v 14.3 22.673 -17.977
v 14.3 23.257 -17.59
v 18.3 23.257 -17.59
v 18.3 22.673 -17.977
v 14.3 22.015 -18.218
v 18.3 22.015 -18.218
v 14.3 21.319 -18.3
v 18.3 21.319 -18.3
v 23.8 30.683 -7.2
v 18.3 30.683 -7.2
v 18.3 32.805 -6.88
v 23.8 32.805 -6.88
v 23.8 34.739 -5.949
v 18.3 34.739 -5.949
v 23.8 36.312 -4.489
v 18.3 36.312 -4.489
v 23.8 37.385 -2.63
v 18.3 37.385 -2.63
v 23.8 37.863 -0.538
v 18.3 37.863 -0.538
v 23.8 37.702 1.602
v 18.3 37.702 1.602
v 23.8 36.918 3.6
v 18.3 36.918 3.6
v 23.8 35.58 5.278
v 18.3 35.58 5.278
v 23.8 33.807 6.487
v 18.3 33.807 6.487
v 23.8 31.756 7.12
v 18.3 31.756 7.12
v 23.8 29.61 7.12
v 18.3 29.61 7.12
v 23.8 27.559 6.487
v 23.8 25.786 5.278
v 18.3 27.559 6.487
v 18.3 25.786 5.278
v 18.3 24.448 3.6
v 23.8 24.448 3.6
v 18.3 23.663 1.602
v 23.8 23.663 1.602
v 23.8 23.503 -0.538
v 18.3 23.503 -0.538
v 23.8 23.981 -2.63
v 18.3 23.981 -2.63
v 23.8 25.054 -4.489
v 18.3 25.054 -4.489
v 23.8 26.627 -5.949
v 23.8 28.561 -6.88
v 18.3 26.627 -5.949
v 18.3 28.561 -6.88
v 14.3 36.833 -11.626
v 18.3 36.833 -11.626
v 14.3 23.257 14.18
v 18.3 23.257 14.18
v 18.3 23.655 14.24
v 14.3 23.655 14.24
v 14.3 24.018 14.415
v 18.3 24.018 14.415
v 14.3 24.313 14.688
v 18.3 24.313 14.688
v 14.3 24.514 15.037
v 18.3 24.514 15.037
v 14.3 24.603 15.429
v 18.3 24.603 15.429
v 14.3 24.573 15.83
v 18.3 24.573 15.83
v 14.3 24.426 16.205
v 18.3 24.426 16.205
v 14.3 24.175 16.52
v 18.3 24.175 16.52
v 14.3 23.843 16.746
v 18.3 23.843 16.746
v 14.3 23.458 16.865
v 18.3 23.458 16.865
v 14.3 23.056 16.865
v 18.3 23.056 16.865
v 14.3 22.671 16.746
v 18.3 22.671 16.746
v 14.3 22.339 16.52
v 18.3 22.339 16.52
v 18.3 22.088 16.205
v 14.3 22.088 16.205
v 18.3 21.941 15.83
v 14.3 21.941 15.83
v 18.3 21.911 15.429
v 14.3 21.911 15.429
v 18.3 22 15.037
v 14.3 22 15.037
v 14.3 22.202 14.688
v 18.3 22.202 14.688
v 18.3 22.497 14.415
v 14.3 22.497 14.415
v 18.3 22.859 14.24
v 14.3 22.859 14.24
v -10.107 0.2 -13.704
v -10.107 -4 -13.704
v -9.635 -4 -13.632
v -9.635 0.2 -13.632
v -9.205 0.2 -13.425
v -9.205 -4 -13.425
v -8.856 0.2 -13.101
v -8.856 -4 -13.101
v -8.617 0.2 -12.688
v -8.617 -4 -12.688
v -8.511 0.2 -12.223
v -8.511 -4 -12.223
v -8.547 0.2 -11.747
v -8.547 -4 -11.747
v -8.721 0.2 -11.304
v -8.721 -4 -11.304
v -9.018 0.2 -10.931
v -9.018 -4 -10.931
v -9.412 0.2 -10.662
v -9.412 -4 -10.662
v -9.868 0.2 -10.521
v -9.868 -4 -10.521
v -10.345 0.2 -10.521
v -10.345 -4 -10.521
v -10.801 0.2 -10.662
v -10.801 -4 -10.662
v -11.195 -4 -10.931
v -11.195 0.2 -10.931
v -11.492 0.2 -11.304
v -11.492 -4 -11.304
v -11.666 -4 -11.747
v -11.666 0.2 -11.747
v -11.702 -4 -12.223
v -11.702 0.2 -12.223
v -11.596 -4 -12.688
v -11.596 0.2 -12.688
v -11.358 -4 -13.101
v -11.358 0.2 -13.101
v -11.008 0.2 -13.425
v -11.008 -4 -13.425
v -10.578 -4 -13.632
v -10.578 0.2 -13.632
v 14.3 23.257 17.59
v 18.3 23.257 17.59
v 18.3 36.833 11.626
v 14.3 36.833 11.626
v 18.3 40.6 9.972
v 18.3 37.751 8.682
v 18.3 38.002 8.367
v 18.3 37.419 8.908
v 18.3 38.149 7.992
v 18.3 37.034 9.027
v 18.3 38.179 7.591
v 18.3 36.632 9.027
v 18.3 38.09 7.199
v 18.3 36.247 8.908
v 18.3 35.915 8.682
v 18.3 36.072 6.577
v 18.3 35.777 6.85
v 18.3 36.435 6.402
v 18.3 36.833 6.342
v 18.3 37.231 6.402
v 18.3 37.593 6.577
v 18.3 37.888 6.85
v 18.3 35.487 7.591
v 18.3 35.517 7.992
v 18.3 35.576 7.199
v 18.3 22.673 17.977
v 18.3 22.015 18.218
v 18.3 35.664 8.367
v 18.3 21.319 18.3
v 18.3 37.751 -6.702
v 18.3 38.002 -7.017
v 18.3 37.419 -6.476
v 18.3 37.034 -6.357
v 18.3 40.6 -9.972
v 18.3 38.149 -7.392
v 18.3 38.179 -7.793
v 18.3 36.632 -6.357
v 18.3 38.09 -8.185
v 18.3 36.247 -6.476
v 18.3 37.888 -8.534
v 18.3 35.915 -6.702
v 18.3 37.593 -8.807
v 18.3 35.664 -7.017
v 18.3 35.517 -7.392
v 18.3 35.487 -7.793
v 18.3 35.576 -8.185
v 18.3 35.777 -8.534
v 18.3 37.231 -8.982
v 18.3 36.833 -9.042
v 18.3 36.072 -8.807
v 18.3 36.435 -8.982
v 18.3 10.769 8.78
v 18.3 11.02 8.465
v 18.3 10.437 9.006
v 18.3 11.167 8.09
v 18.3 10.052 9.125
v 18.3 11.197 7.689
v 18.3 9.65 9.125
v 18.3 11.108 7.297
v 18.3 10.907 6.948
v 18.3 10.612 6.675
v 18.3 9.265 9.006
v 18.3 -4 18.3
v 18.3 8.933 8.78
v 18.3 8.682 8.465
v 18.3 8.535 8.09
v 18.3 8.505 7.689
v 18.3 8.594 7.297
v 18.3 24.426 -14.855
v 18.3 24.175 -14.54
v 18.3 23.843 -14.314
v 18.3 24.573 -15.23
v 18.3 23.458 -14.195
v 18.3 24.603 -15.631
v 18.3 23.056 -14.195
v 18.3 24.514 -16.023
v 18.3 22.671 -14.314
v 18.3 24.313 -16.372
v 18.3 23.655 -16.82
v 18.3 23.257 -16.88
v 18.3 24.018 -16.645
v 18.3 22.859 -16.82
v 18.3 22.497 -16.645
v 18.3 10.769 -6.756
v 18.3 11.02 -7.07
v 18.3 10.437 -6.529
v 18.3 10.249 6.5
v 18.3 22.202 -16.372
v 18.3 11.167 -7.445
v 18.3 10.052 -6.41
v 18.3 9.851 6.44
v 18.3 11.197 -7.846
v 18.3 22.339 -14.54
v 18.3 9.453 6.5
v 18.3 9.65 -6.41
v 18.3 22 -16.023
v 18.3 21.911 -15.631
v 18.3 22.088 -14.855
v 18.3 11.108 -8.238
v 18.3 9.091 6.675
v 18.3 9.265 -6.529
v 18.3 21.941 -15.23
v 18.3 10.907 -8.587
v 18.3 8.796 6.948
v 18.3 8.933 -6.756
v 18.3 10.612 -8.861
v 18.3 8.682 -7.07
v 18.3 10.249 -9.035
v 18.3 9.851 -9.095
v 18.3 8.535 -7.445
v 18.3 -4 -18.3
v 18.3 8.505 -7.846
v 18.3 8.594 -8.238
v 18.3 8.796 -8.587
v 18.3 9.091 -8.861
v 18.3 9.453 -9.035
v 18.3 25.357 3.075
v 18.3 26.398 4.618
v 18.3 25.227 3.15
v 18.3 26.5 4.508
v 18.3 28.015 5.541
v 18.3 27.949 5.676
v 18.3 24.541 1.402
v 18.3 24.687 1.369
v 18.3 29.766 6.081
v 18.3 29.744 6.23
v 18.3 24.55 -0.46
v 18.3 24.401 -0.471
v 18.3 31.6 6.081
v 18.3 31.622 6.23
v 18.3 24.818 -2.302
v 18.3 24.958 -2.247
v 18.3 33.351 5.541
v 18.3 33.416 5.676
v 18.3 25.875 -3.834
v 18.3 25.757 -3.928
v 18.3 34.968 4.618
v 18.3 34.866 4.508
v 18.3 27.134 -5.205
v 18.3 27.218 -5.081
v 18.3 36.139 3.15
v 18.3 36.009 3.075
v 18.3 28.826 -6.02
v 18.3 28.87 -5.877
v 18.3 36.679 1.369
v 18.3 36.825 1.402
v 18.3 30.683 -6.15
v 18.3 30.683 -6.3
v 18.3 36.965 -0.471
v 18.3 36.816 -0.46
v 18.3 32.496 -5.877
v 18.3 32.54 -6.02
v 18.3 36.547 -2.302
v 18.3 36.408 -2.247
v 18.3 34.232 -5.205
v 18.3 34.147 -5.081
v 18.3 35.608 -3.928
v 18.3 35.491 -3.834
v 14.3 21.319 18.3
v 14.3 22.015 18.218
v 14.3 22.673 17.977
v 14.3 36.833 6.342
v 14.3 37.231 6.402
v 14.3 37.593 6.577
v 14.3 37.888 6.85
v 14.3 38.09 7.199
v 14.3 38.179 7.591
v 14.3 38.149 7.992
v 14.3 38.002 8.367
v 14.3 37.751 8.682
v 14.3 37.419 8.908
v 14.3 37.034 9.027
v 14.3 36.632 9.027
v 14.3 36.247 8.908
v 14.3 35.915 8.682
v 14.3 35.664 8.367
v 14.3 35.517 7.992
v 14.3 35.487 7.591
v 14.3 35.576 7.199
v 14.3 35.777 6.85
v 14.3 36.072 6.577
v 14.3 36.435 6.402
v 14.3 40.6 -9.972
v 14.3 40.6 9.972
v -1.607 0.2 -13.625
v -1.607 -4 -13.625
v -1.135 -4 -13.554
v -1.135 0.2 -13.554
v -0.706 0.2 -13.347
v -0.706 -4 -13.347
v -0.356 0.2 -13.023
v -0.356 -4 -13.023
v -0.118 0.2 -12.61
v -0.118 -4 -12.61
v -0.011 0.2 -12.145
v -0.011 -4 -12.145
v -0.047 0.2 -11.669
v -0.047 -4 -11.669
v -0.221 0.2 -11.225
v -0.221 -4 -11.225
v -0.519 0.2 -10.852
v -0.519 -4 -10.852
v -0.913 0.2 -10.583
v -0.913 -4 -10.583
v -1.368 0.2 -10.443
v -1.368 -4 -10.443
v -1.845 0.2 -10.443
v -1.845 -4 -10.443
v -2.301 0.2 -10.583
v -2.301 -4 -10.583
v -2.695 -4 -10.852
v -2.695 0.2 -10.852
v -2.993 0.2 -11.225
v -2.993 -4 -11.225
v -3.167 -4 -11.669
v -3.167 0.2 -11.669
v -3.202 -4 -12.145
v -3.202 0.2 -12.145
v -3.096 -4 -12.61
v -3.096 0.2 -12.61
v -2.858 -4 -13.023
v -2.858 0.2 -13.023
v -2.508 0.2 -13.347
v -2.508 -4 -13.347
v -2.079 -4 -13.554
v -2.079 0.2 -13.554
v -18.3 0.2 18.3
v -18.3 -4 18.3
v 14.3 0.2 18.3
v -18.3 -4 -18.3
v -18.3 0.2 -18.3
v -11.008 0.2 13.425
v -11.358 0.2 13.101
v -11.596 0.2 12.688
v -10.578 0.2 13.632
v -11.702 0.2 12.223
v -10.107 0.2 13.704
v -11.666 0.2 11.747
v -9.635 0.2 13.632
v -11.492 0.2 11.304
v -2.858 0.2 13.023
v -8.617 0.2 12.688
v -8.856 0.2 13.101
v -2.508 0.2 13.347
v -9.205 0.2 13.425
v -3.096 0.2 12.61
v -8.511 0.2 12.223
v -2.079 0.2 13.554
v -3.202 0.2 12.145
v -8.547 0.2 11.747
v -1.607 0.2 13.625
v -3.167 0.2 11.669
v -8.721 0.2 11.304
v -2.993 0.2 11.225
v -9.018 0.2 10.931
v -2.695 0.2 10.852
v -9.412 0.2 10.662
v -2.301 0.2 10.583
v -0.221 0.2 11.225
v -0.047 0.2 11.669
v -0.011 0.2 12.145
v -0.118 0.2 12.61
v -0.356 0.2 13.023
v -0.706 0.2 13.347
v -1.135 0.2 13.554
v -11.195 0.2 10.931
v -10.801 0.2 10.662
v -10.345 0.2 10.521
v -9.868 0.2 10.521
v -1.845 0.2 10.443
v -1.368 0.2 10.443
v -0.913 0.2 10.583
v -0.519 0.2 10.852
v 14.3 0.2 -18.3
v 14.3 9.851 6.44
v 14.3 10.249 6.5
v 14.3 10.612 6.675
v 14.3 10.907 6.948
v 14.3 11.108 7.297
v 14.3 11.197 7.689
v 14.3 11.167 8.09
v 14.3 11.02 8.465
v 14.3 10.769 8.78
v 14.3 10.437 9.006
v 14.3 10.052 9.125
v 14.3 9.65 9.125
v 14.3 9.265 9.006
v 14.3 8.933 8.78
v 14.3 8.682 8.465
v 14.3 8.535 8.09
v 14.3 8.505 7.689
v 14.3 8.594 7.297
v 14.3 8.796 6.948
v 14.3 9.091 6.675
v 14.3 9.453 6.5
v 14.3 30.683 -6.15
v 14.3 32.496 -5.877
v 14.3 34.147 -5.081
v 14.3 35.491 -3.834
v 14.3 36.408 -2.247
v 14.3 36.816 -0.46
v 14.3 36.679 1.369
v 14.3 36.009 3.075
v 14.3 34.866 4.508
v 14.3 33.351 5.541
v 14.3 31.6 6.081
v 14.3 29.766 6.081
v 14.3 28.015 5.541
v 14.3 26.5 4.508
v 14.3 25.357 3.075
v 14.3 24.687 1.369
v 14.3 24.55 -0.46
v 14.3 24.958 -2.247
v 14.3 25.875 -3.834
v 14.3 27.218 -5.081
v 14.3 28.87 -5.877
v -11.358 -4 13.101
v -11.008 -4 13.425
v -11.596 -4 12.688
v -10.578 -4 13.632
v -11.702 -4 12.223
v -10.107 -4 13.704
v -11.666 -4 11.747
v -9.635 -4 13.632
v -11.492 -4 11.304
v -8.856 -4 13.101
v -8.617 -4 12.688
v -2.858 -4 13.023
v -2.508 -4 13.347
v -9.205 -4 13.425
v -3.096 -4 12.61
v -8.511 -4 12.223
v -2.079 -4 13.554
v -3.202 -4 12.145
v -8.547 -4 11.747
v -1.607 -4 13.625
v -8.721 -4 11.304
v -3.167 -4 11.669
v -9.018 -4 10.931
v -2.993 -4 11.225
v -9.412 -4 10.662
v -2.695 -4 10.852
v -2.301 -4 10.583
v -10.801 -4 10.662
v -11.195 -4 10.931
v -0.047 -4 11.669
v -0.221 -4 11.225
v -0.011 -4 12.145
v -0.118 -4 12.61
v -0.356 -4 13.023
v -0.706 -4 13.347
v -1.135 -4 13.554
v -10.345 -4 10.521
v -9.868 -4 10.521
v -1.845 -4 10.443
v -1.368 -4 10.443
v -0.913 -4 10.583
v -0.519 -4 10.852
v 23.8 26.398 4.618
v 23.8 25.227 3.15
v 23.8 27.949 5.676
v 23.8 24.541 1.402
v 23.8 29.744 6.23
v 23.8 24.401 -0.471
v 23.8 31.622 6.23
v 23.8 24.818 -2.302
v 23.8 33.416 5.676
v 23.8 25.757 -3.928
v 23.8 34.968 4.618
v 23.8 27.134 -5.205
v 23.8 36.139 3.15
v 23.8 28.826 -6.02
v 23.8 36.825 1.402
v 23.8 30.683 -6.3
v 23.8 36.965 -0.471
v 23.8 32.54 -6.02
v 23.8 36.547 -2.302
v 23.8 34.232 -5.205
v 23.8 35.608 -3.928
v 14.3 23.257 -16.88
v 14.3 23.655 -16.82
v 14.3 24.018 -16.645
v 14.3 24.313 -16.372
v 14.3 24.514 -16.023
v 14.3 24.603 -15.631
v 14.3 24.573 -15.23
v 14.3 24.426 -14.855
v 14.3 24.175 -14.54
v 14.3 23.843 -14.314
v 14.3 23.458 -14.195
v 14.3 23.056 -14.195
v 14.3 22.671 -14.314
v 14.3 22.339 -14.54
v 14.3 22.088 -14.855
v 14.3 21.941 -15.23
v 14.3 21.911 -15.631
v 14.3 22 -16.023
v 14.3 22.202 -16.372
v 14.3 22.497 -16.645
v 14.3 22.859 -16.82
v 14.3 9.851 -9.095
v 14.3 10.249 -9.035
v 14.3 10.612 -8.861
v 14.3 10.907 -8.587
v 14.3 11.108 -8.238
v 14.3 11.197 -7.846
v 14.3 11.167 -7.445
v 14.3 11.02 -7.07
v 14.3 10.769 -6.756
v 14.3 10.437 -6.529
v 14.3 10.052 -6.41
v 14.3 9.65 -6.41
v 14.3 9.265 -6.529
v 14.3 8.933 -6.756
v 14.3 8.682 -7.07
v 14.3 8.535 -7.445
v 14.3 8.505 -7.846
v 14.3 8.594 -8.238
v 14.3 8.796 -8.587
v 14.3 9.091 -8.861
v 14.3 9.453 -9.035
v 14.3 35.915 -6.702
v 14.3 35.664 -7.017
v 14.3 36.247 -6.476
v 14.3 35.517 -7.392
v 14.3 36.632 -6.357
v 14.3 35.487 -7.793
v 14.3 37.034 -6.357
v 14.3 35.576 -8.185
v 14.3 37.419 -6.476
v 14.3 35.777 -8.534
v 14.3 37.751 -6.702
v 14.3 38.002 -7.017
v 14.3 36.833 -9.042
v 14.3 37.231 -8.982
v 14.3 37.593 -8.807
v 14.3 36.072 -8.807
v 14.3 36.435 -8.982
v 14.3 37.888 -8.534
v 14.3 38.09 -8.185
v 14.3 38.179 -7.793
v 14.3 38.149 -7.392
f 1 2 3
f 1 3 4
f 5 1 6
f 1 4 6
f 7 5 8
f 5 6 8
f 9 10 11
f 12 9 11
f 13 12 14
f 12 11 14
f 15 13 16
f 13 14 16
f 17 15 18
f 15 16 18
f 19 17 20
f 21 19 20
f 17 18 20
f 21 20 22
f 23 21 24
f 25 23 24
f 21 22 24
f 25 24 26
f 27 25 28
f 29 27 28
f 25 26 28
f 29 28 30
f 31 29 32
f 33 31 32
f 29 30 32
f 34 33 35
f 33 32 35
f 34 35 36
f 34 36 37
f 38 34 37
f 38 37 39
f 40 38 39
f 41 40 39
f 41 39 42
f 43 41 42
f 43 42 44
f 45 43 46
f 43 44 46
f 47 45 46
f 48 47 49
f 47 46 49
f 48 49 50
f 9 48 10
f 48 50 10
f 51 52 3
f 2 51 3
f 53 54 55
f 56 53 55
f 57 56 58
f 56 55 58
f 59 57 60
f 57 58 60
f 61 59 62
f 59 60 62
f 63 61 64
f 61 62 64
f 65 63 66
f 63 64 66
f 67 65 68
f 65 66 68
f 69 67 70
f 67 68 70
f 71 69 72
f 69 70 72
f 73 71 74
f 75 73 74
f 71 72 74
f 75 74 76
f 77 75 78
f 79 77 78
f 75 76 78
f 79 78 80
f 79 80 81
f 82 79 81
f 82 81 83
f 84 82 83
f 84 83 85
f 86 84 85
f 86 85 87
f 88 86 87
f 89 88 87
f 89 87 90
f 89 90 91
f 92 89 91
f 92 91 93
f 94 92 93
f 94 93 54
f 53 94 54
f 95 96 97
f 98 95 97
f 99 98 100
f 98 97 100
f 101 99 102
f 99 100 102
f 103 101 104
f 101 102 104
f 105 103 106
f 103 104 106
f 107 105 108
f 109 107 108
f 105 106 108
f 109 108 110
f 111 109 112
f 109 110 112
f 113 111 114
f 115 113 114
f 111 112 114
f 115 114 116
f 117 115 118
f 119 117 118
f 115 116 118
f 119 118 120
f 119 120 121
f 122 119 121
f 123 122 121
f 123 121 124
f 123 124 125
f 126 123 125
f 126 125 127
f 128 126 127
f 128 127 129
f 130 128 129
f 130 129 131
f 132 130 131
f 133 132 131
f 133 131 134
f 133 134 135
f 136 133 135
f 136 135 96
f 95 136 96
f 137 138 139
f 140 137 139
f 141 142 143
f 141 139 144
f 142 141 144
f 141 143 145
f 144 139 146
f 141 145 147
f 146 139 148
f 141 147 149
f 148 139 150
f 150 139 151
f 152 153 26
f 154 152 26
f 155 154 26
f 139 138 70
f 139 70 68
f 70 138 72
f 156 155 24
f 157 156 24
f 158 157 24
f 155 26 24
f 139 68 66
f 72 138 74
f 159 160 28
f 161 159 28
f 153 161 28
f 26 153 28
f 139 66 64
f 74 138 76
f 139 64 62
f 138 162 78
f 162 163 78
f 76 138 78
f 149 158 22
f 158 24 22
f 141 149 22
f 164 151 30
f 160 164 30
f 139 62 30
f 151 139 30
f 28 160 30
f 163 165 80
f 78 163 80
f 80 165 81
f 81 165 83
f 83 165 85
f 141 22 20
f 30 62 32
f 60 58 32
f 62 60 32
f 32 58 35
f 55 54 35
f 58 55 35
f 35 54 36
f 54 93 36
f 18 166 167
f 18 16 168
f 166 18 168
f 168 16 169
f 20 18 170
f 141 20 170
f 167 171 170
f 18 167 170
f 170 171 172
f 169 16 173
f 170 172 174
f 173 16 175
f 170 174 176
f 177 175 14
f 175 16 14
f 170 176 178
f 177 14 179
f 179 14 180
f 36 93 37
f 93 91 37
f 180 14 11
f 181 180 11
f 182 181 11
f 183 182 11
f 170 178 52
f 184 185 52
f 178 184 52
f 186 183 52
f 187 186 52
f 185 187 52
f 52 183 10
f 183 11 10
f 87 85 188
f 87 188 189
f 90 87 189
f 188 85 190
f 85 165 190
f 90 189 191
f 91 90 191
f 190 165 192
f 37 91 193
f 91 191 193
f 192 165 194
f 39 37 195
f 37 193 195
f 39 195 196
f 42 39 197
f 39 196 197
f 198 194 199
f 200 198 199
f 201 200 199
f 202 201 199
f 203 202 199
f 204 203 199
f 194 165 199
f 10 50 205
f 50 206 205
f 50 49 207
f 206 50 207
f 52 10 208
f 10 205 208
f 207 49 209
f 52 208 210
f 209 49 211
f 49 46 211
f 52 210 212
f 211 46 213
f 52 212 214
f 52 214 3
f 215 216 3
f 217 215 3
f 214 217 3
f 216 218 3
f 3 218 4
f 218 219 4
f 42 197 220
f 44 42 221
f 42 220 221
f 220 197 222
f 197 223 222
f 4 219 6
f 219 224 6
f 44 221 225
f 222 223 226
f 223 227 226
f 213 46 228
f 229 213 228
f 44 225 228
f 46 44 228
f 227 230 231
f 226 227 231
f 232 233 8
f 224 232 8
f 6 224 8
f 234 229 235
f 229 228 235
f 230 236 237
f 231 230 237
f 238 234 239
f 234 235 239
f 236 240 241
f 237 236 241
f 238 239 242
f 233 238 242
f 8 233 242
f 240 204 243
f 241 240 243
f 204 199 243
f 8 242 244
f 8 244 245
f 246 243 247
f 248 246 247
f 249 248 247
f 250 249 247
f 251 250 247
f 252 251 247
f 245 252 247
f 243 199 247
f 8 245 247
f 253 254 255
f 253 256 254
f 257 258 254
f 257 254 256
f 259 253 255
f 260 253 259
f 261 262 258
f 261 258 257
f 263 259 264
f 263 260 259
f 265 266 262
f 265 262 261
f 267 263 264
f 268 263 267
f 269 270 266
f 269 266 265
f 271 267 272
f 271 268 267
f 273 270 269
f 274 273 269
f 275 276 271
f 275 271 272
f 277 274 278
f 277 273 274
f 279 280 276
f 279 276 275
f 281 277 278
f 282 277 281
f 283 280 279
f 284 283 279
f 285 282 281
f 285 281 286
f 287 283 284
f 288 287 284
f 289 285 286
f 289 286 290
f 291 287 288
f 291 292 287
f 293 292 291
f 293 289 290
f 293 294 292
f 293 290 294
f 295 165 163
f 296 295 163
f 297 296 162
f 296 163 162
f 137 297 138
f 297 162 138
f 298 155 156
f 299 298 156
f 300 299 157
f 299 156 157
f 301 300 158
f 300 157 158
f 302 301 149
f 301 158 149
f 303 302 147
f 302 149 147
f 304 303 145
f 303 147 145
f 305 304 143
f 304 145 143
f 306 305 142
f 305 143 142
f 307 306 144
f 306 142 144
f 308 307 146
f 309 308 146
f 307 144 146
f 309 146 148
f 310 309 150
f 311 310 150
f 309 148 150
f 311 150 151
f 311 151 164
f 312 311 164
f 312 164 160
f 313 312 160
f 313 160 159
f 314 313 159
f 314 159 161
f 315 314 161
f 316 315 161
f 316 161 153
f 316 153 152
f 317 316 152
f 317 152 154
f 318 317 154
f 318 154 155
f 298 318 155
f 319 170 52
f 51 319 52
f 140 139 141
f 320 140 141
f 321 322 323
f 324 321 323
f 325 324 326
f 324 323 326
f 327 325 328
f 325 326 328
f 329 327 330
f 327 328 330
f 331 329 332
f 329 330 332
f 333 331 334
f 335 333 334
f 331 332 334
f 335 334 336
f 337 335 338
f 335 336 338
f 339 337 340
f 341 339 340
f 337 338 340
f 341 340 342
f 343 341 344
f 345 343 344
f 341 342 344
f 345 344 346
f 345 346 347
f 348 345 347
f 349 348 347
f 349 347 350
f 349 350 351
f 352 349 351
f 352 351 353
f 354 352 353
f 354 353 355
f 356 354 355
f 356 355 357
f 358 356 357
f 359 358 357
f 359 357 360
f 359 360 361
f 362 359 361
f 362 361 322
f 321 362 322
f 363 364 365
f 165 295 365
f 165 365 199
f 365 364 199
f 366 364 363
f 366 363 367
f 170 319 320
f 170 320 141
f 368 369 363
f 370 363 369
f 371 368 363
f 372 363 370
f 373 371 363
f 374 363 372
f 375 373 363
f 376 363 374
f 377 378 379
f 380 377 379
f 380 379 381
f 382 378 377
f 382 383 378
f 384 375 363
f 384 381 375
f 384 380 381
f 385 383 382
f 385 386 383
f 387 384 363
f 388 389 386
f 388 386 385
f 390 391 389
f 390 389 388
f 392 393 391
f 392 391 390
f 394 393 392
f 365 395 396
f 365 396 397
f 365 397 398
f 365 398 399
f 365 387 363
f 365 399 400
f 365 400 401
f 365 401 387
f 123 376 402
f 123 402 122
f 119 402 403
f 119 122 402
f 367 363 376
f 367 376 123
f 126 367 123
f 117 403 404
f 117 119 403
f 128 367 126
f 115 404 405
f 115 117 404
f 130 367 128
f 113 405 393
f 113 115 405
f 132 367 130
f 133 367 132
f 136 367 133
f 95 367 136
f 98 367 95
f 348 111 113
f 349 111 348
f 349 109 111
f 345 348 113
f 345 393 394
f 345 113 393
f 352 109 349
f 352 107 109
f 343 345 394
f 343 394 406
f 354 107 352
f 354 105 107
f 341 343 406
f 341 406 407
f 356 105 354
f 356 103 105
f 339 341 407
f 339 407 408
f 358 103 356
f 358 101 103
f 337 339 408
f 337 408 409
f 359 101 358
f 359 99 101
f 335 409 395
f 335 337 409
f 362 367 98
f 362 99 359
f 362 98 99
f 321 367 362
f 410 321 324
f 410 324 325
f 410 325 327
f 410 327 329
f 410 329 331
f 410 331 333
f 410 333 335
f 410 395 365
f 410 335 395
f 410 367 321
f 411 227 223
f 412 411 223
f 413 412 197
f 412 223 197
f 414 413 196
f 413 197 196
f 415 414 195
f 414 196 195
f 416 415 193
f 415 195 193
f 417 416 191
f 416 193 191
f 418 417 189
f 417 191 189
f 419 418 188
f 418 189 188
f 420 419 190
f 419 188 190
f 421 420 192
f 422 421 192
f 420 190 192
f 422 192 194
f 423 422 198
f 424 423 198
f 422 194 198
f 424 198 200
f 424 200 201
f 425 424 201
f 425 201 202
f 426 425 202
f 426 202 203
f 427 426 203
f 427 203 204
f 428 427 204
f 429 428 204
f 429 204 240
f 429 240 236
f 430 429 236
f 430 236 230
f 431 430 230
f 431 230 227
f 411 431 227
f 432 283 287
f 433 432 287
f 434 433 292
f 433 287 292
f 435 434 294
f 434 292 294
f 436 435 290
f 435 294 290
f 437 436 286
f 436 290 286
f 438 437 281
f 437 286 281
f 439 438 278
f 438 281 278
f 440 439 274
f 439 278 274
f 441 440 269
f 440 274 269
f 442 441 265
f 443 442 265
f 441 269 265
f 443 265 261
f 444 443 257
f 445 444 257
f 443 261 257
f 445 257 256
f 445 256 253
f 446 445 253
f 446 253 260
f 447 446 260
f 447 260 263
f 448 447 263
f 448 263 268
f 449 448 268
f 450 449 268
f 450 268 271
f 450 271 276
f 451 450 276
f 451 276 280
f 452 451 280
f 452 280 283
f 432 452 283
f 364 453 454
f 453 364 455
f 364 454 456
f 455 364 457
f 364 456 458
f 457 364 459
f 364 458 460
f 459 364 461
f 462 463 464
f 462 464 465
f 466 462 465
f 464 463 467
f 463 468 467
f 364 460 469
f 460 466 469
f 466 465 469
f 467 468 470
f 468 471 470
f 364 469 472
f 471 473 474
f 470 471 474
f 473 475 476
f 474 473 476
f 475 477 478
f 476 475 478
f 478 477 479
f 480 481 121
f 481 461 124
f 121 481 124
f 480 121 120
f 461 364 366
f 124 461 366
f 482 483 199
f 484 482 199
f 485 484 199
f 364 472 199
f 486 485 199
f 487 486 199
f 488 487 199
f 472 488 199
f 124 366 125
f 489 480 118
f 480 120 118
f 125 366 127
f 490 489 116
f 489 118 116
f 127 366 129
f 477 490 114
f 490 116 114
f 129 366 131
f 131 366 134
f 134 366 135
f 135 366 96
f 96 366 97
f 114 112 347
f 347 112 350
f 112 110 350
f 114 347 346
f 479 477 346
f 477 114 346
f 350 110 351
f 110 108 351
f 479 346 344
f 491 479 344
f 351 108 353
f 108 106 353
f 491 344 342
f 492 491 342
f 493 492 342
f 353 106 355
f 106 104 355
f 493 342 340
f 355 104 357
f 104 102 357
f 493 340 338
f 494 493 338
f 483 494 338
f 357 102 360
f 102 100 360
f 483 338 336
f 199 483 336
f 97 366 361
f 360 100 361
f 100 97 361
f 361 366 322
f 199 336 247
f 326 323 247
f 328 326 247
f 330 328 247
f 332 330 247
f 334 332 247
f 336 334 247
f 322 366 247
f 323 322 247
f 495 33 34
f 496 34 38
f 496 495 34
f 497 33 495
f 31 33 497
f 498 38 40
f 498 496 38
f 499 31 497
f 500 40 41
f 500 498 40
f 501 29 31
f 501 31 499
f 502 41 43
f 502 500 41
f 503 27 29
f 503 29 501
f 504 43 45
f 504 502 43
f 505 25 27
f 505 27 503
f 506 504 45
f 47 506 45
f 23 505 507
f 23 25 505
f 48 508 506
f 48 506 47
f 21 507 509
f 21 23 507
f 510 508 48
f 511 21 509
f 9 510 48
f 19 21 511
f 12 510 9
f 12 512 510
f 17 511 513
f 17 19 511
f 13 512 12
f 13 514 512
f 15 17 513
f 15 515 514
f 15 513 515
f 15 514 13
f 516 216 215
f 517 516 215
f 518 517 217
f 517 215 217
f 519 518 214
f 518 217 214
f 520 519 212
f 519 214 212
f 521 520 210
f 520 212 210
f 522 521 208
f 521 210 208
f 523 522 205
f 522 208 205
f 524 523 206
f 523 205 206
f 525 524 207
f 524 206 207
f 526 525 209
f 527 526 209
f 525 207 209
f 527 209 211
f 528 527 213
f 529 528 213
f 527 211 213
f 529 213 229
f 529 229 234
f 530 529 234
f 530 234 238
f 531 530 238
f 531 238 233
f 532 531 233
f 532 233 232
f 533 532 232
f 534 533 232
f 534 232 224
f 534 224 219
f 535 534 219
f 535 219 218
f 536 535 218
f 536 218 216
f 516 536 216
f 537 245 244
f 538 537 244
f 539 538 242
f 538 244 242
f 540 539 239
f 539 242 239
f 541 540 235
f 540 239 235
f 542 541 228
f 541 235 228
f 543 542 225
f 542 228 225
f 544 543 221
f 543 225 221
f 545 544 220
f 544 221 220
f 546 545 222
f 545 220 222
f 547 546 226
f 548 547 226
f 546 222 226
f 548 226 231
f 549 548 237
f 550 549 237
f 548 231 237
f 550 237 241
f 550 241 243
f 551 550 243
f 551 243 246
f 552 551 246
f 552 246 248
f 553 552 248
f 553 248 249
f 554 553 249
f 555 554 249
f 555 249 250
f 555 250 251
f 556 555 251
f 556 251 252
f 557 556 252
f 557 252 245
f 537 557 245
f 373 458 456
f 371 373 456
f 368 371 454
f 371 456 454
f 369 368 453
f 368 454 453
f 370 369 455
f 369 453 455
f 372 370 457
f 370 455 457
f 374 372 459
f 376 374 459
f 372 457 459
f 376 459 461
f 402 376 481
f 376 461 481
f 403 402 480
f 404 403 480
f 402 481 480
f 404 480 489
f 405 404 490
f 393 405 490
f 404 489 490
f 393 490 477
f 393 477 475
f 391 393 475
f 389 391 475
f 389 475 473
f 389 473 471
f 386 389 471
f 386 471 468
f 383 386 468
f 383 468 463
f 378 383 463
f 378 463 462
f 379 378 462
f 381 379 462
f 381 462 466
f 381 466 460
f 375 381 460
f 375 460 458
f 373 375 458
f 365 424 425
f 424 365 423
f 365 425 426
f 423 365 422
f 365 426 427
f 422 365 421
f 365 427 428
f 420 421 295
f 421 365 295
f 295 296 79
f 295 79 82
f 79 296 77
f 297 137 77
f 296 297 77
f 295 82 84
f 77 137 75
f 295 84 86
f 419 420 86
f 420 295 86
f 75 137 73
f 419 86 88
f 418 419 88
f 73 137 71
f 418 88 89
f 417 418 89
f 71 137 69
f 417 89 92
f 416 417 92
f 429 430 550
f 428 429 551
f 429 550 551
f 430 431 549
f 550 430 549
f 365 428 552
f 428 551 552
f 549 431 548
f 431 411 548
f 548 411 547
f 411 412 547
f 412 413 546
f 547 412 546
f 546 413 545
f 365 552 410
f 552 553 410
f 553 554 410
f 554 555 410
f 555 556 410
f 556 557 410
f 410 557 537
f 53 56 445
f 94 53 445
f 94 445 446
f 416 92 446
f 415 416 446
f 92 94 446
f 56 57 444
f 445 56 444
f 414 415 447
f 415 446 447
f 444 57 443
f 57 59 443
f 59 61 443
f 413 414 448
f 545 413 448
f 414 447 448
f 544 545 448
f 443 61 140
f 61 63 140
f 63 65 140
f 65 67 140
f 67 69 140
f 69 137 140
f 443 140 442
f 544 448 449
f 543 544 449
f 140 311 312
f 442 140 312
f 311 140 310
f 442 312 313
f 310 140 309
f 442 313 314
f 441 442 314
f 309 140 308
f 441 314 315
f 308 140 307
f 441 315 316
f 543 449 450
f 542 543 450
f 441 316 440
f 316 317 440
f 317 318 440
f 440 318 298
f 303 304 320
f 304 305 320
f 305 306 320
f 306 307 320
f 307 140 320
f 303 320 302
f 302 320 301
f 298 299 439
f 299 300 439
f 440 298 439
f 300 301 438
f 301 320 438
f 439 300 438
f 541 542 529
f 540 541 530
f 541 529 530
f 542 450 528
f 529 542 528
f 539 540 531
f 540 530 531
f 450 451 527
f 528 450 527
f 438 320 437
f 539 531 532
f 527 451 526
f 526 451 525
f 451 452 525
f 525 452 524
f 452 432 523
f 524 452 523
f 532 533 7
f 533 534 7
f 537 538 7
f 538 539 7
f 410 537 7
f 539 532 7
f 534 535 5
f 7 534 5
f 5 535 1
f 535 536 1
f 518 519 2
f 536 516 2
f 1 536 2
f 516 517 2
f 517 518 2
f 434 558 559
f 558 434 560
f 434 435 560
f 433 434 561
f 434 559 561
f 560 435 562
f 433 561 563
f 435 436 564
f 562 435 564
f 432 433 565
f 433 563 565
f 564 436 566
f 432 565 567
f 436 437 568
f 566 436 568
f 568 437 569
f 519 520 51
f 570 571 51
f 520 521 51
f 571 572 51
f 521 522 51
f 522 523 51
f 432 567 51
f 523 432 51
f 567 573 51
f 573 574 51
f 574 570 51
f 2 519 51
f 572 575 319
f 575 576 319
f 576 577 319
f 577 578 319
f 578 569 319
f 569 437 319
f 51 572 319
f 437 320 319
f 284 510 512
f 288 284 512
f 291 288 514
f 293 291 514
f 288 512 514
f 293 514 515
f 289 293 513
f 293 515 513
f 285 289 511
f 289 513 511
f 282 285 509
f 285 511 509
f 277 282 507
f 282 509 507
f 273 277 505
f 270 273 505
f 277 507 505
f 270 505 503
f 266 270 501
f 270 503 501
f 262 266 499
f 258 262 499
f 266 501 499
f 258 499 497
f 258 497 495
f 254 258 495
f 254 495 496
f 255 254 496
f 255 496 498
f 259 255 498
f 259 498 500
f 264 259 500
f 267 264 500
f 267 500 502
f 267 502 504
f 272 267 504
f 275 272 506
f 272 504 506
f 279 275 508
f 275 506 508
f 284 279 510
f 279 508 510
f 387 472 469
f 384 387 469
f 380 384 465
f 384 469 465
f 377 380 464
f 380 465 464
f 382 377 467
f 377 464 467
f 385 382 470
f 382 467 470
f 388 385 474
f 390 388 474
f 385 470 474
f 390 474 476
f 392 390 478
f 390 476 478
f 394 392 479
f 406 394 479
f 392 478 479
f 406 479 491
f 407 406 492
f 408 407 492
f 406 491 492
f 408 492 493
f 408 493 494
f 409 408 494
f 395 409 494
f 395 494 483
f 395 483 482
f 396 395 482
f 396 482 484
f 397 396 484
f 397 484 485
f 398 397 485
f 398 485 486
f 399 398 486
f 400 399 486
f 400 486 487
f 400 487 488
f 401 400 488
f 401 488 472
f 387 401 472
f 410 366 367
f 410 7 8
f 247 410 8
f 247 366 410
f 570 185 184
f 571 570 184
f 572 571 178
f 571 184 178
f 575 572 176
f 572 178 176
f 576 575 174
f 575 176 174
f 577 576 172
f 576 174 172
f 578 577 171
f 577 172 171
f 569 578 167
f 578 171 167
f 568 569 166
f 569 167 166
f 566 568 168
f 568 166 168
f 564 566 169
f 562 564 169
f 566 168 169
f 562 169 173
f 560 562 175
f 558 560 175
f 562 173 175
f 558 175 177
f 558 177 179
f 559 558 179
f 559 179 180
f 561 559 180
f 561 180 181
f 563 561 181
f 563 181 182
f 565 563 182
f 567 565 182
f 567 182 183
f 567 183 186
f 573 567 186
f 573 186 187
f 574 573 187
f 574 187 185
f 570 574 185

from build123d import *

# Parameters (mm, degrees)
EXTRUDE_1_DEPTH      = 40.6
EXTRUDE_1_DEPTH_BACK = 4
SKETCH_1_W           = 36.6
SKETCH_1_H           = 36.6
SKETCH_2_W           = 32.6
SKETCH_2_H           = 36.6
CUT_EXTRUDE_1_DEPTH  = 40.4
SKETCH_3_R           = 6.15
SKETCH_3_R_2         = 1.35
CUT_EXTRUDE_5_DEPTH  = 36.6
FILLET_2_R           = 2
SKETCH_7_R           = 1.6
CUT_EXTRUDE_6_DEPTH  = 10
CUT_EXTRUDE_8_DEPTH  = 10
FILLET_5_R           = 3
FILLET_6_R           = 3
SKETCH_17_R          = 7.2
EXTRUDE_2_DEPTH      = 5.5
SKETCH_18_R          = 6.3
CUT_EXTRUDE_9_DEPTH  = 5.5


with BuildPart() as part:
    # 草图1 → 凸台-拉伸1 (new, two sides: drawn at the far end of the back side and taken through both)
    with BuildSketch(Plane(origin=(0, 0, 0), x_dir=(1, 0, 0), z_dir=(0, 1, 0)).offset(-EXTRUDE_1_DEPTH_BACK)):
        Rectangle(SKETCH_1_W, SKETCH_1_H)
    extrude(amount=EXTRUDE_1_DEPTH + EXTRUDE_1_DEPTH_BACK)

    # 草图2 → 切除-拉伸1 (cut)
    with BuildSketch(Plane(origin=(0, 40.6, 0), x_dir=(1, 0, 0), z_dir=(0, 1, 0))):
        with Locations((-2, 0)):
            Rectangle(SKETCH_2_W, SKETCH_2_H)
    extrude(amount=-CUT_EXTRUDE_1_DEPTH, mode=Mode.SUBTRACT)

    # 草图3 → 切除-拉伸5 (cut)
    with BuildSketch(Plane(origin=(18.3, 0, 0), x_dir=(0, 0, -1), z_dir=(1, 0, 0))):
        with Locations((0, 30.682903148)):
            Circle(SKETCH_3_R)
        with Locations((-7.691951836, 36.832903148)):
            Circle(SKETCH_3_R_2)
        with Locations((7.691951836, 36.832903148)):
            Circle(SKETCH_3_R_2)
        with Locations((-15.529977583, 23.257044321)):
            Circle(SKETCH_3_R_2)
        with Locations((15.529977583, 23.257044321)):
            Circle(SKETCH_3_R_2)
        with Locations((7.745235234, 9.85104245)):
            Circle(SKETCH_3_R_2)
        with Locations((-7.790018794, 9.85104245)):
            Circle(SKETCH_3_R_2)
    extrude(amount=-CUT_EXTRUDE_5_DEPTH, mode=Mode.SUBTRACT)

    # 圆角2
    fillet_2_edges = [part.edges().sort_by_distance(p)[0] for p in [
        (16.3, 40.6, -18.3),
        (16.3, 40.6, 18.3),
    ]]
    fillet(fillet_2_edges, radius=FILLET_2_R)

    # 草图7 → 切除-拉伸6 (cut)
    with BuildSketch(Plane(origin=(0, -4, 0), x_dir=(-1, 0, 0), z_dir=(0, -1, 0))):
        with Locations(Location((1.606935512, 12.025, 0), (0, 0, 90))):
            Circle(SKETCH_7_R)
        with Locations(Location((10.106572894, 12.103513479, 0), (0, 0, 90))):
            Circle(SKETCH_7_R)
        with Locations(Location((10.106572894, -12.103513479, 0), (0, 0, 270))):
            Circle(SKETCH_7_R)
        with Locations(Location((1.606935512, -12.025, 0), (0, 0, 270))):
            Circle(SKETCH_7_R)
    extrude(amount=-CUT_EXTRUDE_6_DEPTH, mode=Mode.SUBTRACT)

    # 草图12 → 切除-拉伸8 (cut)
    with BuildSketch(Plane(origin=(18.3, 0, 0), x_dir=(0, 0, -1), z_dir=(1, 0, 0))):
        Polygon((-17.589988792, 23.257044321), (-11.626385684, 36.832903148), (-9.971575423, 40.6), (-18.3, 40.6), (-18.3, 23.257044321), align=None)
        Polygon((18.3, 23.257044321), (18.3, 40.6), (9.971575423, 40.6), (11.626385684, 36.832903148), (17.589988792, 23.257044321), align=None)
    extrude(amount=-CUT_EXTRUDE_8_DEPTH, mode=Mode.SUBTRACT)

    # 圆角5
    # the kernel refuses this fillet: 3 mm, written as the material it takes off along each edge
    with BuildSketch(Plane(origin=(23.145069229, 23.257044321, 18.3), x_dir=(0, -1, 0), z_dir=(-1, 0, 0))) as fillet_5_piece_1:
        with BuildLine():
            CenterArc((1.938027692, -3), FILLET_5_R, 90, 40.241386347)
            Line((0, -0.710011208), (-0.038760554, -0.664211432))
            ThreePointArc((-0.038760554, -0.664211432), (-0.06, -0.355005604), (-0.06, 0))
            Line((-0.06, 0), (0, 0.06))
            Line((0, 0.06), (1.938027692, 0.06))
            Line((1.938027692, 0.06), (1.938027692, 0))
        make_face()
    extrude(amount=13.690138458, mode=Mode.SUBTRACT)

    # 圆角6
    # the kernel refuses this fillet: 3 mm, written as the material it takes off along each edge
    with BuildSketch(Plane(origin=(23.145069229, 23.257044321, -18.3), x_dir=(0, -1, 0), z_dir=(-1, 0, 0))) as fillet_6_piece_1:
        with BuildLine():
            CenterArc((1.938027692, 3), FILLET_6_R, 229.758613653, 40.241386347)
            Line((0, 0.710011208), (-0.038760554, 0.664211432))
            ThreePointArc((-0.038760554, 0.664211432), (-0.06, 0.355005604), (-0.06, 0))
            Line((-0.06, 0), (0, -0.06))
            Line((0, -0.06), (1.938027692, -0.06))
            Line((1.938027692, -0.06), (1.938027692, 0))
        make_face()
    extrude(amount=13.690138458, mode=Mode.SUBTRACT)

    # 草图17 → 凸台-拉伸2 (add)
    with BuildSketch(Plane(origin=(18.3, 0, 0), x_dir=(0, 0, -1), z_dir=(1, 0, 0))):
        with Locations((0, 30.682903148)):
            Circle(SKETCH_17_R)
    extrude(amount=EXTRUDE_2_DEPTH)

    # 草图18 → 切除-拉伸9 (cut)
    with BuildSketch(Plane(origin=(23.8, 0, 0), x_dir=(0, 0, -1), z_dir=(1, 0, 0))):
        with Locations((0, 30.682903148)):
            Circle(SKETCH_18_R)
    extrude(amount=-CUT_EXTRUDE_9_DEPTH, mode=Mode.SUBTRACT)


solid = part.part
